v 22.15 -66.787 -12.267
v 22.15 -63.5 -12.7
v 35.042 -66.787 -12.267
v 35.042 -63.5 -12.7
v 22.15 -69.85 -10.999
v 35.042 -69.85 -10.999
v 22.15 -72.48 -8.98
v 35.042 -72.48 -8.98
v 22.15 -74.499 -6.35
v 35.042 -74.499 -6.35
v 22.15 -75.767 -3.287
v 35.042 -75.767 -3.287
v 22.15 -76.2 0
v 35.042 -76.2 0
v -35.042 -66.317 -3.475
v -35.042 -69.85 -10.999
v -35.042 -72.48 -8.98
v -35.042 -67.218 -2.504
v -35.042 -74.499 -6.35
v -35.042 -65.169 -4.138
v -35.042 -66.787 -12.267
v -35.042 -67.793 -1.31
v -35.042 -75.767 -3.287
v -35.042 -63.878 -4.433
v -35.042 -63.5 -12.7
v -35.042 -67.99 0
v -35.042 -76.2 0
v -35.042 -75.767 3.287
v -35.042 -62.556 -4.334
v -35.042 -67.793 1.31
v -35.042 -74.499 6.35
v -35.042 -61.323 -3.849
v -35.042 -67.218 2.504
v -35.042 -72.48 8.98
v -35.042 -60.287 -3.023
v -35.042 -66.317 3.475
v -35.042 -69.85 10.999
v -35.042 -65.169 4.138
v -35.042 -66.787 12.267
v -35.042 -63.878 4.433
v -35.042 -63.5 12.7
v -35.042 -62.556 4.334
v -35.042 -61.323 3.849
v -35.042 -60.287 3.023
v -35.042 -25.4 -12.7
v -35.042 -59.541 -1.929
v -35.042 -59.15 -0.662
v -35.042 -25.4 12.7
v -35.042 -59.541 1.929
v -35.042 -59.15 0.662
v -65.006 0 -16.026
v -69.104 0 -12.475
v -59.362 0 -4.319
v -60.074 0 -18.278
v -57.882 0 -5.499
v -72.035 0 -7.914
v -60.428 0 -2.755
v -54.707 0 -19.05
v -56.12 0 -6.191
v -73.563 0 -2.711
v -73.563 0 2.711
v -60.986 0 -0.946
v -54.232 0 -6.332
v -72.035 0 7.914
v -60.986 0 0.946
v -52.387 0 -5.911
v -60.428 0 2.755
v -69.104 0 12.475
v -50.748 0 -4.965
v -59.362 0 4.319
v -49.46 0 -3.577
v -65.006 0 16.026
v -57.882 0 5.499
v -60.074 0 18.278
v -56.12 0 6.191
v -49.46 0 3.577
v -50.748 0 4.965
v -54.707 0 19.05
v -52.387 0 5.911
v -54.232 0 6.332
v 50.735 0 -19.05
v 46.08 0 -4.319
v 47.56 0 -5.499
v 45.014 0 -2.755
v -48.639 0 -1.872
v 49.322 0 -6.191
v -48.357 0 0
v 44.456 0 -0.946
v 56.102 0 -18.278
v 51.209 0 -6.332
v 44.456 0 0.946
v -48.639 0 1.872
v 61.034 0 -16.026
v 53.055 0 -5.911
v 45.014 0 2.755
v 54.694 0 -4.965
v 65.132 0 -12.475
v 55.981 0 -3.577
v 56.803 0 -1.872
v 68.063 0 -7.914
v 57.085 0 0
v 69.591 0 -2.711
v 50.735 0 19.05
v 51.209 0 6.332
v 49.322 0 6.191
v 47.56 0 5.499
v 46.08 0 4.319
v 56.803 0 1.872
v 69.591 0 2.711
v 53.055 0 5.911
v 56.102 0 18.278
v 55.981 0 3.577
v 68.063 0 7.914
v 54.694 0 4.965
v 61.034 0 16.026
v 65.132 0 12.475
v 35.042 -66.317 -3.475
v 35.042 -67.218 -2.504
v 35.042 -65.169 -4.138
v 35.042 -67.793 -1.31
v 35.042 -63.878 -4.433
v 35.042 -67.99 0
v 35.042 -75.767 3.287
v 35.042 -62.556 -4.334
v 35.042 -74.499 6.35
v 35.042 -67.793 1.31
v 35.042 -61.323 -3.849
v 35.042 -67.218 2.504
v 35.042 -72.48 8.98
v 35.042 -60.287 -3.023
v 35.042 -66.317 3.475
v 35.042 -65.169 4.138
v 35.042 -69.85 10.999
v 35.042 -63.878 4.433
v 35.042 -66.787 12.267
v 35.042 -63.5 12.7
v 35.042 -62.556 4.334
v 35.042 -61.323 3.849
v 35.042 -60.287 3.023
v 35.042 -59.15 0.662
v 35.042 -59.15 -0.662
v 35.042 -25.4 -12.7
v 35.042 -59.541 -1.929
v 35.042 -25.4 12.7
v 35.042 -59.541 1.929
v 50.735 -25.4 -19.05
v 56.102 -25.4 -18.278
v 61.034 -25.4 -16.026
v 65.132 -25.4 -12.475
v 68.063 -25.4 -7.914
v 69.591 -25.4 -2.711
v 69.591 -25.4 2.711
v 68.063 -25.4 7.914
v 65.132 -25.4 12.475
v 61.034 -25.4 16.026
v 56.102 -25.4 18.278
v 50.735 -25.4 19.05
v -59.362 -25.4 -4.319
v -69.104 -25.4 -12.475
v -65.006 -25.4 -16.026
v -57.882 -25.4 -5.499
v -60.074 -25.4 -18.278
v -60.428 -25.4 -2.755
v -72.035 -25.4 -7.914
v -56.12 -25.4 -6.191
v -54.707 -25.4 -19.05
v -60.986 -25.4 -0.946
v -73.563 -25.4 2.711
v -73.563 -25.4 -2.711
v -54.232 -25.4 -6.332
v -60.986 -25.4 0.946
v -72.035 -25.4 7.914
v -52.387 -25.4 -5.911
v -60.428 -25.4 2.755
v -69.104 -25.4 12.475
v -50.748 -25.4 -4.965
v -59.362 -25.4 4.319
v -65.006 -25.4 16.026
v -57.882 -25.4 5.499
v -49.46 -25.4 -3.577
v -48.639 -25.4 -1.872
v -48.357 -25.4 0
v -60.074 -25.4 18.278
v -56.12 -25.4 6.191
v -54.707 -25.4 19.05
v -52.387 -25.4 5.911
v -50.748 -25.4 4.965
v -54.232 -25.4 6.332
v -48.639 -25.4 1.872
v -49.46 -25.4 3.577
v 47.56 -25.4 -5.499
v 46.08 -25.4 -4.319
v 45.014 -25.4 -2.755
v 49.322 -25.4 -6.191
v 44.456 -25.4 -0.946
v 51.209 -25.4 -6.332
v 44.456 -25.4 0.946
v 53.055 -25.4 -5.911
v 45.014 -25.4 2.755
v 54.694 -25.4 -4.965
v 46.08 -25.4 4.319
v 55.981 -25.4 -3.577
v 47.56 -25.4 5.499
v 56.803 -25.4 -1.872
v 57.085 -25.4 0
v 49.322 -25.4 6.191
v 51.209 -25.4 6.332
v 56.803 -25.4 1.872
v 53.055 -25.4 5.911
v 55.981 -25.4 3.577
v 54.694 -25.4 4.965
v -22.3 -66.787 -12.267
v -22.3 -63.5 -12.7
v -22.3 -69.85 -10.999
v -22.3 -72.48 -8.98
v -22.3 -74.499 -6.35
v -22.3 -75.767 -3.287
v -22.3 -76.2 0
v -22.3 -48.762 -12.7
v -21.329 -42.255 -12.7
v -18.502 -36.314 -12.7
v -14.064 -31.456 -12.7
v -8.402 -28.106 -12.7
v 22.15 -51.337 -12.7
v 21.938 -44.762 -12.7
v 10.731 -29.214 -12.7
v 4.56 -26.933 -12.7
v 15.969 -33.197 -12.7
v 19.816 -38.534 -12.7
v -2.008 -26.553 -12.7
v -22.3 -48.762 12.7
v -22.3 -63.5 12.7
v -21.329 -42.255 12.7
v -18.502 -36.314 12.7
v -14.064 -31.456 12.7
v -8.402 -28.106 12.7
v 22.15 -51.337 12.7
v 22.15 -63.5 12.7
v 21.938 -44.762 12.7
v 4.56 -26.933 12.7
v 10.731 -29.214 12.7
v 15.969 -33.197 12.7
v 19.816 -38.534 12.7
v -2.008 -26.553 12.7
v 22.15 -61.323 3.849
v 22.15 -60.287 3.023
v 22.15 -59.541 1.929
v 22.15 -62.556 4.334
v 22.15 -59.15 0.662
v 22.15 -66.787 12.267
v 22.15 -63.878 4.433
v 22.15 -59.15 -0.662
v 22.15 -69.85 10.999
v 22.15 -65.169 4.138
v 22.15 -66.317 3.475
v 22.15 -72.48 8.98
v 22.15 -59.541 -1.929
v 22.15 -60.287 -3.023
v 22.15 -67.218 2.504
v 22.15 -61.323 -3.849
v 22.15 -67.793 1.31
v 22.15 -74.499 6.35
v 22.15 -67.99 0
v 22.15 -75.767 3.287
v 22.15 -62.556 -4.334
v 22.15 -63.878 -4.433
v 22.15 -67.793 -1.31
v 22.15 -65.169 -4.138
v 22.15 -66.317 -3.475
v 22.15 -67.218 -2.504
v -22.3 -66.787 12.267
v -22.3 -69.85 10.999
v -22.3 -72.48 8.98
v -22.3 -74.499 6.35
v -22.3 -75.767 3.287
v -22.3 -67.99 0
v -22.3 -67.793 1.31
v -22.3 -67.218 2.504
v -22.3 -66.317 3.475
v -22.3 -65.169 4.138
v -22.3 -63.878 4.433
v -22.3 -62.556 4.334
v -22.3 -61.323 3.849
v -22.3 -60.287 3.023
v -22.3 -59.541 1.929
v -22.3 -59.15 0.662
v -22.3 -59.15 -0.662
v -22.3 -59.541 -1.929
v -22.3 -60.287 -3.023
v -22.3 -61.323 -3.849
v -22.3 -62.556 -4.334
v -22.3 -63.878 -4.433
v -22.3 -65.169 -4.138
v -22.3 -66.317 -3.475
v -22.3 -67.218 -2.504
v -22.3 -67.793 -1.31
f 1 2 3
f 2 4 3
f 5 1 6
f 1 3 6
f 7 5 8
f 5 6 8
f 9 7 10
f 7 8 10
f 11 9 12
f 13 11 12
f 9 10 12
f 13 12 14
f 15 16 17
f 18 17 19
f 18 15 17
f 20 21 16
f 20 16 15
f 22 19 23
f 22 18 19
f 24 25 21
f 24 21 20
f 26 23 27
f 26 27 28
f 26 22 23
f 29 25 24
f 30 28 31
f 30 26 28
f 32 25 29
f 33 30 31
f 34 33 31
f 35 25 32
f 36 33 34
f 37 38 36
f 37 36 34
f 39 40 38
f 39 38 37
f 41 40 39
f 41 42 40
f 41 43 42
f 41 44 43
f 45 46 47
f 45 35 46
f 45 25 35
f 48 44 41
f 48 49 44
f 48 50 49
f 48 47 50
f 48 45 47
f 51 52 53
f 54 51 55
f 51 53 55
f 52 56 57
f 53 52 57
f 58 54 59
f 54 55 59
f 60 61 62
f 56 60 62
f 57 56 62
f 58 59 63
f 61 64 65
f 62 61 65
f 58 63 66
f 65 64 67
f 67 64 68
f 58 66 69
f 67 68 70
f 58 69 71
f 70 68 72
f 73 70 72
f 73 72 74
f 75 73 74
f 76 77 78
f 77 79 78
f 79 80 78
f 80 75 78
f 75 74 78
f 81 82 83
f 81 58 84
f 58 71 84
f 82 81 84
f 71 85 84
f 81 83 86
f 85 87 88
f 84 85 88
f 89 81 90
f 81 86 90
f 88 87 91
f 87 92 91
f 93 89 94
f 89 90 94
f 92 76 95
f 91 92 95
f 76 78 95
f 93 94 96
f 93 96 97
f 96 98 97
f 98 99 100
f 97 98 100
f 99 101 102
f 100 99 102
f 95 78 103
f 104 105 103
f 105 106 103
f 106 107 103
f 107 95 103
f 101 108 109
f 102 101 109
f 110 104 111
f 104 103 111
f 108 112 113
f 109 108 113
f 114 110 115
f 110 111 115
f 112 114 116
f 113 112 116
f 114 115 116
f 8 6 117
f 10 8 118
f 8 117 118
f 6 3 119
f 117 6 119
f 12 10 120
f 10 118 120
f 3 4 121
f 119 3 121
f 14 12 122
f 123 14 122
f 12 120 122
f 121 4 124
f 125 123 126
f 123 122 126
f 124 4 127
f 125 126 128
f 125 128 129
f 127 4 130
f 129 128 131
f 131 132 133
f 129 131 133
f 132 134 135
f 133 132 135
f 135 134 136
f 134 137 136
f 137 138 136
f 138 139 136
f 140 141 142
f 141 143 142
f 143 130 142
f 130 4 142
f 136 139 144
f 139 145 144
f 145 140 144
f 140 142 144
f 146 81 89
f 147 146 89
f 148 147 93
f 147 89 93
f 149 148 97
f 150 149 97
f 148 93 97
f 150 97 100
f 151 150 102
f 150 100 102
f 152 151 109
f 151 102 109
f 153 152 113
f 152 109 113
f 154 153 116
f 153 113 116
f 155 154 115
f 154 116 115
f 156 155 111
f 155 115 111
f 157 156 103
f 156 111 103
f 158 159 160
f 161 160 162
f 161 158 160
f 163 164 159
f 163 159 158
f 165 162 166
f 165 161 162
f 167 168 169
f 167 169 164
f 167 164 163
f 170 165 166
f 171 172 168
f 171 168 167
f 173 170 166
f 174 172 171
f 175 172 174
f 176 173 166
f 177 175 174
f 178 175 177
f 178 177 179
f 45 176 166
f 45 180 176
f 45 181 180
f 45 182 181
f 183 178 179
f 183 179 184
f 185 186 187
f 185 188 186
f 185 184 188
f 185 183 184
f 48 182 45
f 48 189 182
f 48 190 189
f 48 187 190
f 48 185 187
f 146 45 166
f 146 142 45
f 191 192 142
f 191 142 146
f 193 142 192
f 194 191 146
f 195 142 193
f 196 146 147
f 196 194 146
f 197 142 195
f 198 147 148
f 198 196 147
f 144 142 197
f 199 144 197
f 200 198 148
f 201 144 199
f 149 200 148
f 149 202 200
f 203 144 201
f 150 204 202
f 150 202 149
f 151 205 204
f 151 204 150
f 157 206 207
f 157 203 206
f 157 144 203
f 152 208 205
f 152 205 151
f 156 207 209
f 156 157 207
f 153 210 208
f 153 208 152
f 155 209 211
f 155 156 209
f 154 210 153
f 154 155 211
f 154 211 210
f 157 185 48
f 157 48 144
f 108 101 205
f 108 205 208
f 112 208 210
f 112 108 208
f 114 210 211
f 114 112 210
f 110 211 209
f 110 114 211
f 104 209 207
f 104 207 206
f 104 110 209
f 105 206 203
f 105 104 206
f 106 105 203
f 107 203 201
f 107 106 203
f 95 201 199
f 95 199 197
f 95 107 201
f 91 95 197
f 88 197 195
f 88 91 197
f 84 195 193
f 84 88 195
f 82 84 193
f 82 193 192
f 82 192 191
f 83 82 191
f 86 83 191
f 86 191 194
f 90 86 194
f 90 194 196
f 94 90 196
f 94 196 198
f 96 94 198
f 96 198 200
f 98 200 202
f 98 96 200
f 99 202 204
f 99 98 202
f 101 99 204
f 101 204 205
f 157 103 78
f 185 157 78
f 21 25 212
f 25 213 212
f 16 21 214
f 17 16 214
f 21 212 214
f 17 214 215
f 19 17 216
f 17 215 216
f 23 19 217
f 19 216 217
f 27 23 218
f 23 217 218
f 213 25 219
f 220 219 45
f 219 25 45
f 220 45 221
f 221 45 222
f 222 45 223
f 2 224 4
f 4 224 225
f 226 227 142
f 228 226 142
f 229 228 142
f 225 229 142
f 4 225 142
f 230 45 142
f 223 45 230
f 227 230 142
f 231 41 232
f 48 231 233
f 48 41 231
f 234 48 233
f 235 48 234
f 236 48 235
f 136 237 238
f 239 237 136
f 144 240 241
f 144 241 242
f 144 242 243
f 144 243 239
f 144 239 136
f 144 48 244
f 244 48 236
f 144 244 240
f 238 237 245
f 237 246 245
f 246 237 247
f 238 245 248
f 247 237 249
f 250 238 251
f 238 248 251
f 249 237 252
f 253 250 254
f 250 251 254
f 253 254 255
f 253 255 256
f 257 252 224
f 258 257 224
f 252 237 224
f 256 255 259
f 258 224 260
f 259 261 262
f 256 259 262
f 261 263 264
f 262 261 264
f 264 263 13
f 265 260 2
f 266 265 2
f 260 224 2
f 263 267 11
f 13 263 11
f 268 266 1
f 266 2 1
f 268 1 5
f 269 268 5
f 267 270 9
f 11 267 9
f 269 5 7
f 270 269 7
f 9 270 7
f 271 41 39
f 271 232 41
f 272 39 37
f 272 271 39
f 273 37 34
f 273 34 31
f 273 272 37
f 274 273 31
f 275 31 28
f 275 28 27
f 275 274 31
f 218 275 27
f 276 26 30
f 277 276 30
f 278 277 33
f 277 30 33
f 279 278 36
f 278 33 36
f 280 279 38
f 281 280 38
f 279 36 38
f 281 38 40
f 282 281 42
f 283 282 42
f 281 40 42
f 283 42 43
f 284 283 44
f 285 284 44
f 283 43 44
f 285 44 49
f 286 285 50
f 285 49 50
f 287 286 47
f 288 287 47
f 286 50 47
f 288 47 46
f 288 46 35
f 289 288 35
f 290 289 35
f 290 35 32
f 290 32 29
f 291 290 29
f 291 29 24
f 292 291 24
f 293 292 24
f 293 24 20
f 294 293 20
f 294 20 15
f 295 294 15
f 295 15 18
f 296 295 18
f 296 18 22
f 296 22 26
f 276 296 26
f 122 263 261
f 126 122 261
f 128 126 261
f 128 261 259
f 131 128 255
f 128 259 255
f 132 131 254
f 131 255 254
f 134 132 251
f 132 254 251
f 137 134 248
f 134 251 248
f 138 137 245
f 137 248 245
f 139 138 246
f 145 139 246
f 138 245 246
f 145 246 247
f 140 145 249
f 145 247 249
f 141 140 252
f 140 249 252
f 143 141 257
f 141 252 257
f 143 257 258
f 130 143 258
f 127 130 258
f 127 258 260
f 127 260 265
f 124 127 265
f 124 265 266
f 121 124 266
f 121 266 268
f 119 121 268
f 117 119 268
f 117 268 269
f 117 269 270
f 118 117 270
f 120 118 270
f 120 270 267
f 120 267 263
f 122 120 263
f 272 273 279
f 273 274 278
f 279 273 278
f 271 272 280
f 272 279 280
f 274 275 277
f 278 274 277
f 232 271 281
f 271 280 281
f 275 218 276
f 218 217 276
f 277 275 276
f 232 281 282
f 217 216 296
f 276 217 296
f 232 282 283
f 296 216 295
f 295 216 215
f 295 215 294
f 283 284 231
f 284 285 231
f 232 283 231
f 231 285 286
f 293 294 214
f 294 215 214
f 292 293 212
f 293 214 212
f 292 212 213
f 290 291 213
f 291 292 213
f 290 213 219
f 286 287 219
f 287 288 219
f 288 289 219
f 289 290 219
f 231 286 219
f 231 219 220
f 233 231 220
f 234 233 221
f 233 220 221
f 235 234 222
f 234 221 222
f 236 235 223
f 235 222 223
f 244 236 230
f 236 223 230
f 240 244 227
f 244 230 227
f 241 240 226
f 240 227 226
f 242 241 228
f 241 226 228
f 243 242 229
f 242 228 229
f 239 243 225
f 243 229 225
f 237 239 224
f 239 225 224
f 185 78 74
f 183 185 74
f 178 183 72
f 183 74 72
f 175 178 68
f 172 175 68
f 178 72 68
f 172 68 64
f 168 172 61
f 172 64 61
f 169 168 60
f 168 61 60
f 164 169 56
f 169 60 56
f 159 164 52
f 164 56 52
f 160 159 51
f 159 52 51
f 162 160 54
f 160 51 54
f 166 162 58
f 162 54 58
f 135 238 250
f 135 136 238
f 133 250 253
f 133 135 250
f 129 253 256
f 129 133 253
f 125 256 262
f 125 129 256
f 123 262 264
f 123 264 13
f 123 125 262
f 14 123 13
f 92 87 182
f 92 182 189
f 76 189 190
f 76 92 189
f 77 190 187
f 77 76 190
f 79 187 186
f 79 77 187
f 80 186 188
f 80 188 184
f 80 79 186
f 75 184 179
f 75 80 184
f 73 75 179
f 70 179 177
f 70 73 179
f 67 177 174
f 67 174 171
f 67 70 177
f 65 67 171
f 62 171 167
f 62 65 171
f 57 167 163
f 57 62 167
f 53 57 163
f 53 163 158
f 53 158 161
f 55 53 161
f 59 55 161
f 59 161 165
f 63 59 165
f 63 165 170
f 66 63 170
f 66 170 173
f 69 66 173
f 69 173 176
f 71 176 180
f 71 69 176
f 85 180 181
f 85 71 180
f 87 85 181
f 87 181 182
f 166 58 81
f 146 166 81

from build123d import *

# Parameters (mm, degrees)
F0_R     = 6.35
F1_DEPTH = 25.4
F2_W     = 70.0848072124
F2_H     = 25.4
F3_DEPTH = 50.8
F5_DEPTH = 25.4
F6_R     = 4.445
F7_DEPTH = 127
F8_R     = 12.69999


# Not quite as in the source:
# - a fillet or chamfer is up to 0.001 mm smaller than in the source, because OpenCascade refuses the exact size


with BuildPart() as f1:
    # F0 (on Front) → F1 (new body)
    with BuildSketch(Plane.XZ):
        with BuildLine():
            Line((-54.7069231111, -19.05), (50.7348023818, -19.05))
            ThreePointArc((50.7348023818, -19.05), (69.7848023818, 0), (50.7348023818, 19.05))
            Line((50.7348023818, 19.05), (-54.7069231111, 19.05))
            ThreePointArc((-54.7069231111, 19.05), (-73.7569231111, 0), (-54.7069231111, -19.05))
        make_face()
        with Locations((-54.7069231111, 0)):
            Circle(F0_R, mode=Mode.SUBTRACT)
        with Locations((50.7348023818, 0)):
            Circle(F0_R, mode=Mode.SUBTRACT)
    extrude(amount=F1_DEPTH)

    # F2 (on face) → F3 (join)
    with BuildSketch(Plane.XZ.offset(25.4)):
        Rectangle(F2_W, F2_H)
    extrude(amount=F3_DEPTH)

    # F4 (on face) → F5 (cut)
    with BuildSketch(Plane(origin=(0, 0, -12.7), x_dir=(1, 0, 0), z_dir=(0, 0, -1))):
        with BuildLine():
            Line((22.1503823996, 76.2), (-22.2996176004, 76.2))
            Line((-22.2996176004, 76.2), (-22.2996176004, 48.7618595362))
            ThreePointArc((-22.2996176004, 48.7618595362), (1.2899395164, 26.4995819984), (22.1503823996, 51.3374186365))
            Line((22.1503823996, 51.3374186365), (22.1503823996, 76.2))
        make_face()
    extrude(amount=-F5_DEPTH, mode=Mode.SUBTRACT)

    # F6 (on face) → F7 (cut)
    with BuildSketch(Plane(origin=(-35.0424036062, 0, 0), x_dir=(0, -1, 0), z_dir=(-1, 0, 0))):
        with Locations((63.5453920611, 0)):
            Circle(F6_R)
    extrude(amount=-F7_DEPTH, mode=Mode.SUBTRACT)

    # F8 (radius 12.7 in the source; OpenCascade refuses exactly that, so slightly less here)
    f8_edges = [f1.edges().sort_by_distance(p)[0] for p in [
        (-28.671011, -76.2, 12.7),
        (-28.671011, -76.2, -12.7),
        (28.596393, -76.2, 12.7),
        (28.596393, -76.2, -12.7),
    ]]
    fillet(f8_edges, radius=F8_R)


solid = f1.part
